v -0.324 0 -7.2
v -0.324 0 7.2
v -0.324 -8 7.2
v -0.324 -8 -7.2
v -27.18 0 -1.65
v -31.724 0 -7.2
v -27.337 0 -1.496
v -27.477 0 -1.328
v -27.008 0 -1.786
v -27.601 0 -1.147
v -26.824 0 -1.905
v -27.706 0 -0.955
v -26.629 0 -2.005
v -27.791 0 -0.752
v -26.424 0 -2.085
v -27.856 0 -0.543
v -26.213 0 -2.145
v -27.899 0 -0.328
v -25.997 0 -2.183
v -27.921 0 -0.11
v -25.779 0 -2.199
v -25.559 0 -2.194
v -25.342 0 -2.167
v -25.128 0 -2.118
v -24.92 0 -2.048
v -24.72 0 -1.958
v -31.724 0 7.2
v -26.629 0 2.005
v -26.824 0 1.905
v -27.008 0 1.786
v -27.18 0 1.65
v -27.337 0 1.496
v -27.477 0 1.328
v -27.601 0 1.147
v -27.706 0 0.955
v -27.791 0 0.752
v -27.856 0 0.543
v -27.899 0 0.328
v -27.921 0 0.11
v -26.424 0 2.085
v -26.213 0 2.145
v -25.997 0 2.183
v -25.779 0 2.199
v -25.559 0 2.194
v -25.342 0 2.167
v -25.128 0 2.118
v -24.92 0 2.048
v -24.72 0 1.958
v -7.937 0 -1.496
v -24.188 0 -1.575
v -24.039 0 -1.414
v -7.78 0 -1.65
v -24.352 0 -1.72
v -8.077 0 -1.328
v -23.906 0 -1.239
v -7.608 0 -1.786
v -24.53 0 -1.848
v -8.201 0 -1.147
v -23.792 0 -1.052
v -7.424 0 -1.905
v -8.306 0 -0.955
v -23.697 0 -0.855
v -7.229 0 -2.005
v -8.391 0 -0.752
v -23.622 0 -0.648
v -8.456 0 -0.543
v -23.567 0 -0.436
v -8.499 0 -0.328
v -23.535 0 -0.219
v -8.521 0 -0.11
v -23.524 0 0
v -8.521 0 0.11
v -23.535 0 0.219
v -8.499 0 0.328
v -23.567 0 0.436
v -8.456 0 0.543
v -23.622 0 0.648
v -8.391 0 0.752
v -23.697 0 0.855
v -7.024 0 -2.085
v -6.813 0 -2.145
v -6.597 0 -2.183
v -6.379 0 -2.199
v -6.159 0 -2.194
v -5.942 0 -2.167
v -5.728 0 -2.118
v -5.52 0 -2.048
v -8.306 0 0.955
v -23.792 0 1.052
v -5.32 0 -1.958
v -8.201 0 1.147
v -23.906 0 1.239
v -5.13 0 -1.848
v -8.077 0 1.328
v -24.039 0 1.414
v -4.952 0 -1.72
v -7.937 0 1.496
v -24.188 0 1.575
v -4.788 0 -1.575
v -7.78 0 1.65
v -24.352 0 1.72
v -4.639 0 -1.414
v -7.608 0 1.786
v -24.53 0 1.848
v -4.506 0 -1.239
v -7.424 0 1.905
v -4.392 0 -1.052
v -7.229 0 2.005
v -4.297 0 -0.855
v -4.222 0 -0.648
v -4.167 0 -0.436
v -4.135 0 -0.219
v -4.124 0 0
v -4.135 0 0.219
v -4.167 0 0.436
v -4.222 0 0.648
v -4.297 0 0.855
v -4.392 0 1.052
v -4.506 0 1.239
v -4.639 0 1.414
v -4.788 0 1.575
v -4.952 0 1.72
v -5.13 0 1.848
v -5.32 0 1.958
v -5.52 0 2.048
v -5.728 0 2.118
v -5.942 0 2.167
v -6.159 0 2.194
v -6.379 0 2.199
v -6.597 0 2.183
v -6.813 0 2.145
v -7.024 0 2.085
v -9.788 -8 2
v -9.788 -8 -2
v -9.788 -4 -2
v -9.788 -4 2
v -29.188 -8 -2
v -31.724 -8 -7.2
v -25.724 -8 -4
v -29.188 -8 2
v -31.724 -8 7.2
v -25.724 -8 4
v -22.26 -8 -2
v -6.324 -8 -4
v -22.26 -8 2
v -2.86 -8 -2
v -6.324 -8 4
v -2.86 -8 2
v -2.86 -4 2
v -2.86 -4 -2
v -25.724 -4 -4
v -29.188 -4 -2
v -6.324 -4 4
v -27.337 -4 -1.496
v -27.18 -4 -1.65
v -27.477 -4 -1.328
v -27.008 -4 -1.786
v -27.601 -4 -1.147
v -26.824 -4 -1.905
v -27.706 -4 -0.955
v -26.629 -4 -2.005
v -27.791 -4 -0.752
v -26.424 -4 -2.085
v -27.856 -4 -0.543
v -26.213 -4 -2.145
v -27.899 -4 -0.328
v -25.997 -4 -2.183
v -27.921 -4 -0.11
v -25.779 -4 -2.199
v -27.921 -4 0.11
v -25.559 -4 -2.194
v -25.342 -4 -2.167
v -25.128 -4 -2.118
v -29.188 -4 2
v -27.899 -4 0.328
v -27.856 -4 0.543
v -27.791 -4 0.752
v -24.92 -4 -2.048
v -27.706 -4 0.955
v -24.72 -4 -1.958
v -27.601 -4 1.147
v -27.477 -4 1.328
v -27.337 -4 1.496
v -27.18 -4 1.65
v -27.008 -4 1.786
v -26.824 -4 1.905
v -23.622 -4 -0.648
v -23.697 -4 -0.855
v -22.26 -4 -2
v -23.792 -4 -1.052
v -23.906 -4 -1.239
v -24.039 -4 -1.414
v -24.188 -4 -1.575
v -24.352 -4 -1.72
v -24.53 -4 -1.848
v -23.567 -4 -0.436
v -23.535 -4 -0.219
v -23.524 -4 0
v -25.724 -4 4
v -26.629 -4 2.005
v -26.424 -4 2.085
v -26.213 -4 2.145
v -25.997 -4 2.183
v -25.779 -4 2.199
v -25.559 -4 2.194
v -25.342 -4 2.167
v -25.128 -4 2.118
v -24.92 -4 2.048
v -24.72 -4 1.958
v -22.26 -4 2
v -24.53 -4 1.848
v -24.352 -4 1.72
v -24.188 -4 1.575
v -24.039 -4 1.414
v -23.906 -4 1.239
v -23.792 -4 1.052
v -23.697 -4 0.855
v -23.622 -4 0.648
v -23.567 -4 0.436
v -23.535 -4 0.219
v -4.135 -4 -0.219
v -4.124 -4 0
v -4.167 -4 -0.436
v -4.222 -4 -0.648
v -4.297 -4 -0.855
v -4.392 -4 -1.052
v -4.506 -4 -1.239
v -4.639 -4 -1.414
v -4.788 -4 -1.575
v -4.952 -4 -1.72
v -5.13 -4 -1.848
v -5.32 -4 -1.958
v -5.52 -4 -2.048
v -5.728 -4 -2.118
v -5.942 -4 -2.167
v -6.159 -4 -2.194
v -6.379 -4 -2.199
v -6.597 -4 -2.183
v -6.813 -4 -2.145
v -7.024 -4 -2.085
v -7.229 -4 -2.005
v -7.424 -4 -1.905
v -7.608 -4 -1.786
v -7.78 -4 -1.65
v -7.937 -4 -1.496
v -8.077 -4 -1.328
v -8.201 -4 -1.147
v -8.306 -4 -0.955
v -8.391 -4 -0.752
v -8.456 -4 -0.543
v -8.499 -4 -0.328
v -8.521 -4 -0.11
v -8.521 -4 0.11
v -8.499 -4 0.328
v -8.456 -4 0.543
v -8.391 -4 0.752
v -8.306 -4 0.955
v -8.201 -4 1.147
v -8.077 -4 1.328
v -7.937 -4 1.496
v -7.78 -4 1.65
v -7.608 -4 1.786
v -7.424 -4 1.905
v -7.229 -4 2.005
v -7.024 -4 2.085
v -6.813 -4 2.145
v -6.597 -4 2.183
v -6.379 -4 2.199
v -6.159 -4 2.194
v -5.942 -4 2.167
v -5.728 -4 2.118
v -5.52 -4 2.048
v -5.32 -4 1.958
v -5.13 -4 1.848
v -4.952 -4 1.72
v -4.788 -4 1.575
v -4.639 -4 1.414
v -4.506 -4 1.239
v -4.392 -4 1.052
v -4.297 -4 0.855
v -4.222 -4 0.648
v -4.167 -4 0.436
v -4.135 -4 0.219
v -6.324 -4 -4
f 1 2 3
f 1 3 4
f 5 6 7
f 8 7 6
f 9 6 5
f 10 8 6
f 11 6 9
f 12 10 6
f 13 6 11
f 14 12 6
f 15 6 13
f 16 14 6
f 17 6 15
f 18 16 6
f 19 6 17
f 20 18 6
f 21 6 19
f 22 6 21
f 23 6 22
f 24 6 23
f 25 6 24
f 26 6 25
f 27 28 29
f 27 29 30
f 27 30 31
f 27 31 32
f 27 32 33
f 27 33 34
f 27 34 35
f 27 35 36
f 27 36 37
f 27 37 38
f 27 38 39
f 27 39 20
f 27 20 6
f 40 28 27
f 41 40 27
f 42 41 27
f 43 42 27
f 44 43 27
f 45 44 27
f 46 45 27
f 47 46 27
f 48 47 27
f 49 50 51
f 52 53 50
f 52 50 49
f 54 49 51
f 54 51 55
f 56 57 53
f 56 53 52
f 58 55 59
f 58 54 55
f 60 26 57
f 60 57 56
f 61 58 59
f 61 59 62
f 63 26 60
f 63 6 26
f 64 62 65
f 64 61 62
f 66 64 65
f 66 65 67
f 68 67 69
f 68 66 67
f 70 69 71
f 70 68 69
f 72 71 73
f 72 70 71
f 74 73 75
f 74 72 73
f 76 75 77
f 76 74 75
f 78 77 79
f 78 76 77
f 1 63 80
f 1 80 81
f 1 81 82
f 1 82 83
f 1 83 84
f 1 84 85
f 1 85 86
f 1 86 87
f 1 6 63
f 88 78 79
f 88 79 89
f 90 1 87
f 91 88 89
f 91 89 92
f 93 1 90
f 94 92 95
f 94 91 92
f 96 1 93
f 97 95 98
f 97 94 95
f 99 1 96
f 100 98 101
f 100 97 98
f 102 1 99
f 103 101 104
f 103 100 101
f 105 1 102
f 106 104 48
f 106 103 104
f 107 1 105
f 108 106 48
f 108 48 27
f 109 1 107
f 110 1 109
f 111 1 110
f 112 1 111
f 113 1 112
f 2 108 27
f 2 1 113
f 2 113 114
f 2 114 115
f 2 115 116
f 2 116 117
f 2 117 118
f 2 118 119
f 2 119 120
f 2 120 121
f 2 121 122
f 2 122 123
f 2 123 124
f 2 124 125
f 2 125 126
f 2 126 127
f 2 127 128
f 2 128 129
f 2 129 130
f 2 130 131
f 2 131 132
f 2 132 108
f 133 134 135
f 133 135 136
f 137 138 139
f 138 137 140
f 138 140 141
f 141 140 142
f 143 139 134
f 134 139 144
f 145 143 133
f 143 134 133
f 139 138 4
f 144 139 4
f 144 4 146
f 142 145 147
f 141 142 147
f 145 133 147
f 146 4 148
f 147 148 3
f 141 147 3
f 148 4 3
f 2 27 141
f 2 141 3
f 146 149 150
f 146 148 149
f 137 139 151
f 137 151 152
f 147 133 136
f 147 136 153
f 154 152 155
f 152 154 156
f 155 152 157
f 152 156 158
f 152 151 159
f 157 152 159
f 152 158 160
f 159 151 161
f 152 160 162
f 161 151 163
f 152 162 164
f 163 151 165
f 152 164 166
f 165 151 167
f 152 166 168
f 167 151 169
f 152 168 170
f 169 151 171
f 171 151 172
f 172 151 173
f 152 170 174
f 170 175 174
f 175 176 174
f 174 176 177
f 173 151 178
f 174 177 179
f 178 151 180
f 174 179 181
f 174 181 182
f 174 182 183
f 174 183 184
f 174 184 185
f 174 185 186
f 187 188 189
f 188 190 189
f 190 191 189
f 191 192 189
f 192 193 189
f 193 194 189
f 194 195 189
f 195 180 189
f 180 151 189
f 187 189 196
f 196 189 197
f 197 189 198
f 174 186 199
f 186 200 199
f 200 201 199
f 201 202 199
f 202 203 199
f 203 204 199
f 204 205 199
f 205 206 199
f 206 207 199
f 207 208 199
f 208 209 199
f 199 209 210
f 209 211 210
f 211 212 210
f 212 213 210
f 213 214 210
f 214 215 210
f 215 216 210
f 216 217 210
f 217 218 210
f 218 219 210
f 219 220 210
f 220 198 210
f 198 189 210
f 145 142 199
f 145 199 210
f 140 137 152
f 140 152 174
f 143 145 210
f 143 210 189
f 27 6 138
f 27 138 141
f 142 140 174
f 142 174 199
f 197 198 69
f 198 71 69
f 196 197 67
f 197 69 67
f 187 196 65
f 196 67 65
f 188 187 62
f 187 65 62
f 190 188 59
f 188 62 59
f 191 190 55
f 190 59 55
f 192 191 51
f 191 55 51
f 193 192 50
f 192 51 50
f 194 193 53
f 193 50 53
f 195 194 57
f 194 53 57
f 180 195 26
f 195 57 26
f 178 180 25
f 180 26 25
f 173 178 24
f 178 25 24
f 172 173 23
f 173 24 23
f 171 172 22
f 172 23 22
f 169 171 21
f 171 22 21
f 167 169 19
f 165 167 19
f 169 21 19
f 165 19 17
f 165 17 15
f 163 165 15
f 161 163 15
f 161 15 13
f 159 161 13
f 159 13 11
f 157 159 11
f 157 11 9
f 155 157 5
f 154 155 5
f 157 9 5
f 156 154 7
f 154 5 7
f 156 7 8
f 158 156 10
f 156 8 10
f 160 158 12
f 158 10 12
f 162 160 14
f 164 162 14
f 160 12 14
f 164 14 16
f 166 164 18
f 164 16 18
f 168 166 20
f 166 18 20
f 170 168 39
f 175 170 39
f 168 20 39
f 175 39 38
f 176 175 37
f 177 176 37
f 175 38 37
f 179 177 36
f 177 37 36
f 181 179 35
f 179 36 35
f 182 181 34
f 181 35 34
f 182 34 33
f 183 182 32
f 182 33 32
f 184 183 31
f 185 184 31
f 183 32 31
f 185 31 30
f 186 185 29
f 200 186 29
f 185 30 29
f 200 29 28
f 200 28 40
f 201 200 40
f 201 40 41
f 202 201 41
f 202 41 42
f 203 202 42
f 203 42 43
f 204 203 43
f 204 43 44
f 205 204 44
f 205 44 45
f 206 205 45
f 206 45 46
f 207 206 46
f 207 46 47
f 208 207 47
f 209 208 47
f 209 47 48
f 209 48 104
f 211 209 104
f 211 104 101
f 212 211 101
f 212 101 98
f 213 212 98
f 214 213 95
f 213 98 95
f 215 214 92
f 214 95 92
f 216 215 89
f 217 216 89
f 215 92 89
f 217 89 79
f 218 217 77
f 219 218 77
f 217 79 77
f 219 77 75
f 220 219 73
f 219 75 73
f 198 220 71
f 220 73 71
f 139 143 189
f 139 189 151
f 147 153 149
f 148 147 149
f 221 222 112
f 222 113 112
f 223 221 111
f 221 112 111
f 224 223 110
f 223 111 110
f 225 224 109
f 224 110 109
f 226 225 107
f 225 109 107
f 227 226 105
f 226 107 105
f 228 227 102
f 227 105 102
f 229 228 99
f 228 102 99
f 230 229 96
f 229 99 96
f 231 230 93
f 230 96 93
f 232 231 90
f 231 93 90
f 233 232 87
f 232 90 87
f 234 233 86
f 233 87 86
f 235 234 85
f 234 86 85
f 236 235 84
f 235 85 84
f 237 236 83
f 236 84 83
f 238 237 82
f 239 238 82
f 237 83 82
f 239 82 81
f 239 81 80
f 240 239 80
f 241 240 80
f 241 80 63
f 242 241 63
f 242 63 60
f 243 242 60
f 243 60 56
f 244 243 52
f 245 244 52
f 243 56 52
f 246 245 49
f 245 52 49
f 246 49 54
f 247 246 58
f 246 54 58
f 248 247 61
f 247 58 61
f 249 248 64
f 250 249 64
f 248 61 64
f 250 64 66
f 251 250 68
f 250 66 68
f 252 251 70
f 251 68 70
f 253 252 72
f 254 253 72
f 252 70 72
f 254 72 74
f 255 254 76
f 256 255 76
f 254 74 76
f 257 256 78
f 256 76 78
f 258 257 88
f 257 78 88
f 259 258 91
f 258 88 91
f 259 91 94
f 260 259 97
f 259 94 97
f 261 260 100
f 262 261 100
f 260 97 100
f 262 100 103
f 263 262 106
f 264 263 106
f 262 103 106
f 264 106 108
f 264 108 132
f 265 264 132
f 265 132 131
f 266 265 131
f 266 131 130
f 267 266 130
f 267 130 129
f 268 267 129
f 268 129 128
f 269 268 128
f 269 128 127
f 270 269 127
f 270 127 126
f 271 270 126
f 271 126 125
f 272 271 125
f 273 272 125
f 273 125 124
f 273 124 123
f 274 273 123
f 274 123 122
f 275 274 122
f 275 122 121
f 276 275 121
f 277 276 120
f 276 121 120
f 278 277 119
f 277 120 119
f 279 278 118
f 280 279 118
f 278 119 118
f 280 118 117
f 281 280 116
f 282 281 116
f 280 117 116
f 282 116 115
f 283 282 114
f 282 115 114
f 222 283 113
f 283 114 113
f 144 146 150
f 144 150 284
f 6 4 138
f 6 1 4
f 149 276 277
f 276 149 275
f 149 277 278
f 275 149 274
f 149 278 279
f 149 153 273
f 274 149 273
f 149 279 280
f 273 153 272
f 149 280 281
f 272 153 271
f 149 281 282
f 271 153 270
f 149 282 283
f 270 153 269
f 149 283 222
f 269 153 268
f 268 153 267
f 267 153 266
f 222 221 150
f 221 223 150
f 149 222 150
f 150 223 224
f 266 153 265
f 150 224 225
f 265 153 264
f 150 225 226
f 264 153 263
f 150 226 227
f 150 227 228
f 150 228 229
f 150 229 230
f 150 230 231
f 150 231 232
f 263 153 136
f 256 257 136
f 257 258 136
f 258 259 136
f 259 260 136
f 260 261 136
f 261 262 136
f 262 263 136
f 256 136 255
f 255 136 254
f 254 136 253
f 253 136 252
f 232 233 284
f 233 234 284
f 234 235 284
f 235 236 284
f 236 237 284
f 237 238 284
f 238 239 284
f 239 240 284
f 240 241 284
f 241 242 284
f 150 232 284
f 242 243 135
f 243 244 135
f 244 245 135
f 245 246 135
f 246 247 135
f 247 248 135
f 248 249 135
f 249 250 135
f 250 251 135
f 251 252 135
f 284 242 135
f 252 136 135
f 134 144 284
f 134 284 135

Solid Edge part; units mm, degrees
sketch "Sketch1" plane through (0, 0, 0) normal (0, -1, 0) x (1, 0, 0)
  circle A0 centre (-6.3238, 0) radius 2.2
  line L0 (-31.7238, 7.2) -> (-0.3238, 7.2)
  line L1 (-0.3238, 7.2) -> (-0.3238, -7.2)
  line L2 (-0.3238, -7.2) -> (-31.7238, -7.2)
  line L3 (-31.7238, -7.2) -> (-31.7238, 7.2)
  circle A1 centre (-25.7238, 0) radius 2.2
  dimension "D1" = 19.4
  dimension "D2" = 6
  dimension "D3" = 4.4
  dimension "D4" = 4.4
  dimension "D5" = 7.2
  dimension "D6" = 7.2
  dimension "D7" = 6
extrude "Protrusion1" add sketch "Sketch1" along normal blind 8
sketch "Sketch2" plane through (-14.9238, -8, 0) normal (0, -1, 0) x (1, 0, 0)
  line L0 (-14.2641, -2) -> (-14.2641, 2)
  line L1 (-14.2641, 2) -> (-10.8, 4)
  line L2 (-10.8, 4) -> (-7.3359, 2)
  line L3 (-7.3359, 2) -> (-7.3359, -2)
  line L4 (-7.3359, -2) -> (-10.8, -4)
  line L5 (-10.8, -4) -> (-14.2641, -2)
  dimension "D1" = 8
extrude "ExtrudedCutout_1" cut sketch "Sketch2" against normal blind 4
mirror "Mirror1" about plane through (-16.0238, -4, 0) normal (-1, 0, 0) of "ExtrudedCutout_1"
